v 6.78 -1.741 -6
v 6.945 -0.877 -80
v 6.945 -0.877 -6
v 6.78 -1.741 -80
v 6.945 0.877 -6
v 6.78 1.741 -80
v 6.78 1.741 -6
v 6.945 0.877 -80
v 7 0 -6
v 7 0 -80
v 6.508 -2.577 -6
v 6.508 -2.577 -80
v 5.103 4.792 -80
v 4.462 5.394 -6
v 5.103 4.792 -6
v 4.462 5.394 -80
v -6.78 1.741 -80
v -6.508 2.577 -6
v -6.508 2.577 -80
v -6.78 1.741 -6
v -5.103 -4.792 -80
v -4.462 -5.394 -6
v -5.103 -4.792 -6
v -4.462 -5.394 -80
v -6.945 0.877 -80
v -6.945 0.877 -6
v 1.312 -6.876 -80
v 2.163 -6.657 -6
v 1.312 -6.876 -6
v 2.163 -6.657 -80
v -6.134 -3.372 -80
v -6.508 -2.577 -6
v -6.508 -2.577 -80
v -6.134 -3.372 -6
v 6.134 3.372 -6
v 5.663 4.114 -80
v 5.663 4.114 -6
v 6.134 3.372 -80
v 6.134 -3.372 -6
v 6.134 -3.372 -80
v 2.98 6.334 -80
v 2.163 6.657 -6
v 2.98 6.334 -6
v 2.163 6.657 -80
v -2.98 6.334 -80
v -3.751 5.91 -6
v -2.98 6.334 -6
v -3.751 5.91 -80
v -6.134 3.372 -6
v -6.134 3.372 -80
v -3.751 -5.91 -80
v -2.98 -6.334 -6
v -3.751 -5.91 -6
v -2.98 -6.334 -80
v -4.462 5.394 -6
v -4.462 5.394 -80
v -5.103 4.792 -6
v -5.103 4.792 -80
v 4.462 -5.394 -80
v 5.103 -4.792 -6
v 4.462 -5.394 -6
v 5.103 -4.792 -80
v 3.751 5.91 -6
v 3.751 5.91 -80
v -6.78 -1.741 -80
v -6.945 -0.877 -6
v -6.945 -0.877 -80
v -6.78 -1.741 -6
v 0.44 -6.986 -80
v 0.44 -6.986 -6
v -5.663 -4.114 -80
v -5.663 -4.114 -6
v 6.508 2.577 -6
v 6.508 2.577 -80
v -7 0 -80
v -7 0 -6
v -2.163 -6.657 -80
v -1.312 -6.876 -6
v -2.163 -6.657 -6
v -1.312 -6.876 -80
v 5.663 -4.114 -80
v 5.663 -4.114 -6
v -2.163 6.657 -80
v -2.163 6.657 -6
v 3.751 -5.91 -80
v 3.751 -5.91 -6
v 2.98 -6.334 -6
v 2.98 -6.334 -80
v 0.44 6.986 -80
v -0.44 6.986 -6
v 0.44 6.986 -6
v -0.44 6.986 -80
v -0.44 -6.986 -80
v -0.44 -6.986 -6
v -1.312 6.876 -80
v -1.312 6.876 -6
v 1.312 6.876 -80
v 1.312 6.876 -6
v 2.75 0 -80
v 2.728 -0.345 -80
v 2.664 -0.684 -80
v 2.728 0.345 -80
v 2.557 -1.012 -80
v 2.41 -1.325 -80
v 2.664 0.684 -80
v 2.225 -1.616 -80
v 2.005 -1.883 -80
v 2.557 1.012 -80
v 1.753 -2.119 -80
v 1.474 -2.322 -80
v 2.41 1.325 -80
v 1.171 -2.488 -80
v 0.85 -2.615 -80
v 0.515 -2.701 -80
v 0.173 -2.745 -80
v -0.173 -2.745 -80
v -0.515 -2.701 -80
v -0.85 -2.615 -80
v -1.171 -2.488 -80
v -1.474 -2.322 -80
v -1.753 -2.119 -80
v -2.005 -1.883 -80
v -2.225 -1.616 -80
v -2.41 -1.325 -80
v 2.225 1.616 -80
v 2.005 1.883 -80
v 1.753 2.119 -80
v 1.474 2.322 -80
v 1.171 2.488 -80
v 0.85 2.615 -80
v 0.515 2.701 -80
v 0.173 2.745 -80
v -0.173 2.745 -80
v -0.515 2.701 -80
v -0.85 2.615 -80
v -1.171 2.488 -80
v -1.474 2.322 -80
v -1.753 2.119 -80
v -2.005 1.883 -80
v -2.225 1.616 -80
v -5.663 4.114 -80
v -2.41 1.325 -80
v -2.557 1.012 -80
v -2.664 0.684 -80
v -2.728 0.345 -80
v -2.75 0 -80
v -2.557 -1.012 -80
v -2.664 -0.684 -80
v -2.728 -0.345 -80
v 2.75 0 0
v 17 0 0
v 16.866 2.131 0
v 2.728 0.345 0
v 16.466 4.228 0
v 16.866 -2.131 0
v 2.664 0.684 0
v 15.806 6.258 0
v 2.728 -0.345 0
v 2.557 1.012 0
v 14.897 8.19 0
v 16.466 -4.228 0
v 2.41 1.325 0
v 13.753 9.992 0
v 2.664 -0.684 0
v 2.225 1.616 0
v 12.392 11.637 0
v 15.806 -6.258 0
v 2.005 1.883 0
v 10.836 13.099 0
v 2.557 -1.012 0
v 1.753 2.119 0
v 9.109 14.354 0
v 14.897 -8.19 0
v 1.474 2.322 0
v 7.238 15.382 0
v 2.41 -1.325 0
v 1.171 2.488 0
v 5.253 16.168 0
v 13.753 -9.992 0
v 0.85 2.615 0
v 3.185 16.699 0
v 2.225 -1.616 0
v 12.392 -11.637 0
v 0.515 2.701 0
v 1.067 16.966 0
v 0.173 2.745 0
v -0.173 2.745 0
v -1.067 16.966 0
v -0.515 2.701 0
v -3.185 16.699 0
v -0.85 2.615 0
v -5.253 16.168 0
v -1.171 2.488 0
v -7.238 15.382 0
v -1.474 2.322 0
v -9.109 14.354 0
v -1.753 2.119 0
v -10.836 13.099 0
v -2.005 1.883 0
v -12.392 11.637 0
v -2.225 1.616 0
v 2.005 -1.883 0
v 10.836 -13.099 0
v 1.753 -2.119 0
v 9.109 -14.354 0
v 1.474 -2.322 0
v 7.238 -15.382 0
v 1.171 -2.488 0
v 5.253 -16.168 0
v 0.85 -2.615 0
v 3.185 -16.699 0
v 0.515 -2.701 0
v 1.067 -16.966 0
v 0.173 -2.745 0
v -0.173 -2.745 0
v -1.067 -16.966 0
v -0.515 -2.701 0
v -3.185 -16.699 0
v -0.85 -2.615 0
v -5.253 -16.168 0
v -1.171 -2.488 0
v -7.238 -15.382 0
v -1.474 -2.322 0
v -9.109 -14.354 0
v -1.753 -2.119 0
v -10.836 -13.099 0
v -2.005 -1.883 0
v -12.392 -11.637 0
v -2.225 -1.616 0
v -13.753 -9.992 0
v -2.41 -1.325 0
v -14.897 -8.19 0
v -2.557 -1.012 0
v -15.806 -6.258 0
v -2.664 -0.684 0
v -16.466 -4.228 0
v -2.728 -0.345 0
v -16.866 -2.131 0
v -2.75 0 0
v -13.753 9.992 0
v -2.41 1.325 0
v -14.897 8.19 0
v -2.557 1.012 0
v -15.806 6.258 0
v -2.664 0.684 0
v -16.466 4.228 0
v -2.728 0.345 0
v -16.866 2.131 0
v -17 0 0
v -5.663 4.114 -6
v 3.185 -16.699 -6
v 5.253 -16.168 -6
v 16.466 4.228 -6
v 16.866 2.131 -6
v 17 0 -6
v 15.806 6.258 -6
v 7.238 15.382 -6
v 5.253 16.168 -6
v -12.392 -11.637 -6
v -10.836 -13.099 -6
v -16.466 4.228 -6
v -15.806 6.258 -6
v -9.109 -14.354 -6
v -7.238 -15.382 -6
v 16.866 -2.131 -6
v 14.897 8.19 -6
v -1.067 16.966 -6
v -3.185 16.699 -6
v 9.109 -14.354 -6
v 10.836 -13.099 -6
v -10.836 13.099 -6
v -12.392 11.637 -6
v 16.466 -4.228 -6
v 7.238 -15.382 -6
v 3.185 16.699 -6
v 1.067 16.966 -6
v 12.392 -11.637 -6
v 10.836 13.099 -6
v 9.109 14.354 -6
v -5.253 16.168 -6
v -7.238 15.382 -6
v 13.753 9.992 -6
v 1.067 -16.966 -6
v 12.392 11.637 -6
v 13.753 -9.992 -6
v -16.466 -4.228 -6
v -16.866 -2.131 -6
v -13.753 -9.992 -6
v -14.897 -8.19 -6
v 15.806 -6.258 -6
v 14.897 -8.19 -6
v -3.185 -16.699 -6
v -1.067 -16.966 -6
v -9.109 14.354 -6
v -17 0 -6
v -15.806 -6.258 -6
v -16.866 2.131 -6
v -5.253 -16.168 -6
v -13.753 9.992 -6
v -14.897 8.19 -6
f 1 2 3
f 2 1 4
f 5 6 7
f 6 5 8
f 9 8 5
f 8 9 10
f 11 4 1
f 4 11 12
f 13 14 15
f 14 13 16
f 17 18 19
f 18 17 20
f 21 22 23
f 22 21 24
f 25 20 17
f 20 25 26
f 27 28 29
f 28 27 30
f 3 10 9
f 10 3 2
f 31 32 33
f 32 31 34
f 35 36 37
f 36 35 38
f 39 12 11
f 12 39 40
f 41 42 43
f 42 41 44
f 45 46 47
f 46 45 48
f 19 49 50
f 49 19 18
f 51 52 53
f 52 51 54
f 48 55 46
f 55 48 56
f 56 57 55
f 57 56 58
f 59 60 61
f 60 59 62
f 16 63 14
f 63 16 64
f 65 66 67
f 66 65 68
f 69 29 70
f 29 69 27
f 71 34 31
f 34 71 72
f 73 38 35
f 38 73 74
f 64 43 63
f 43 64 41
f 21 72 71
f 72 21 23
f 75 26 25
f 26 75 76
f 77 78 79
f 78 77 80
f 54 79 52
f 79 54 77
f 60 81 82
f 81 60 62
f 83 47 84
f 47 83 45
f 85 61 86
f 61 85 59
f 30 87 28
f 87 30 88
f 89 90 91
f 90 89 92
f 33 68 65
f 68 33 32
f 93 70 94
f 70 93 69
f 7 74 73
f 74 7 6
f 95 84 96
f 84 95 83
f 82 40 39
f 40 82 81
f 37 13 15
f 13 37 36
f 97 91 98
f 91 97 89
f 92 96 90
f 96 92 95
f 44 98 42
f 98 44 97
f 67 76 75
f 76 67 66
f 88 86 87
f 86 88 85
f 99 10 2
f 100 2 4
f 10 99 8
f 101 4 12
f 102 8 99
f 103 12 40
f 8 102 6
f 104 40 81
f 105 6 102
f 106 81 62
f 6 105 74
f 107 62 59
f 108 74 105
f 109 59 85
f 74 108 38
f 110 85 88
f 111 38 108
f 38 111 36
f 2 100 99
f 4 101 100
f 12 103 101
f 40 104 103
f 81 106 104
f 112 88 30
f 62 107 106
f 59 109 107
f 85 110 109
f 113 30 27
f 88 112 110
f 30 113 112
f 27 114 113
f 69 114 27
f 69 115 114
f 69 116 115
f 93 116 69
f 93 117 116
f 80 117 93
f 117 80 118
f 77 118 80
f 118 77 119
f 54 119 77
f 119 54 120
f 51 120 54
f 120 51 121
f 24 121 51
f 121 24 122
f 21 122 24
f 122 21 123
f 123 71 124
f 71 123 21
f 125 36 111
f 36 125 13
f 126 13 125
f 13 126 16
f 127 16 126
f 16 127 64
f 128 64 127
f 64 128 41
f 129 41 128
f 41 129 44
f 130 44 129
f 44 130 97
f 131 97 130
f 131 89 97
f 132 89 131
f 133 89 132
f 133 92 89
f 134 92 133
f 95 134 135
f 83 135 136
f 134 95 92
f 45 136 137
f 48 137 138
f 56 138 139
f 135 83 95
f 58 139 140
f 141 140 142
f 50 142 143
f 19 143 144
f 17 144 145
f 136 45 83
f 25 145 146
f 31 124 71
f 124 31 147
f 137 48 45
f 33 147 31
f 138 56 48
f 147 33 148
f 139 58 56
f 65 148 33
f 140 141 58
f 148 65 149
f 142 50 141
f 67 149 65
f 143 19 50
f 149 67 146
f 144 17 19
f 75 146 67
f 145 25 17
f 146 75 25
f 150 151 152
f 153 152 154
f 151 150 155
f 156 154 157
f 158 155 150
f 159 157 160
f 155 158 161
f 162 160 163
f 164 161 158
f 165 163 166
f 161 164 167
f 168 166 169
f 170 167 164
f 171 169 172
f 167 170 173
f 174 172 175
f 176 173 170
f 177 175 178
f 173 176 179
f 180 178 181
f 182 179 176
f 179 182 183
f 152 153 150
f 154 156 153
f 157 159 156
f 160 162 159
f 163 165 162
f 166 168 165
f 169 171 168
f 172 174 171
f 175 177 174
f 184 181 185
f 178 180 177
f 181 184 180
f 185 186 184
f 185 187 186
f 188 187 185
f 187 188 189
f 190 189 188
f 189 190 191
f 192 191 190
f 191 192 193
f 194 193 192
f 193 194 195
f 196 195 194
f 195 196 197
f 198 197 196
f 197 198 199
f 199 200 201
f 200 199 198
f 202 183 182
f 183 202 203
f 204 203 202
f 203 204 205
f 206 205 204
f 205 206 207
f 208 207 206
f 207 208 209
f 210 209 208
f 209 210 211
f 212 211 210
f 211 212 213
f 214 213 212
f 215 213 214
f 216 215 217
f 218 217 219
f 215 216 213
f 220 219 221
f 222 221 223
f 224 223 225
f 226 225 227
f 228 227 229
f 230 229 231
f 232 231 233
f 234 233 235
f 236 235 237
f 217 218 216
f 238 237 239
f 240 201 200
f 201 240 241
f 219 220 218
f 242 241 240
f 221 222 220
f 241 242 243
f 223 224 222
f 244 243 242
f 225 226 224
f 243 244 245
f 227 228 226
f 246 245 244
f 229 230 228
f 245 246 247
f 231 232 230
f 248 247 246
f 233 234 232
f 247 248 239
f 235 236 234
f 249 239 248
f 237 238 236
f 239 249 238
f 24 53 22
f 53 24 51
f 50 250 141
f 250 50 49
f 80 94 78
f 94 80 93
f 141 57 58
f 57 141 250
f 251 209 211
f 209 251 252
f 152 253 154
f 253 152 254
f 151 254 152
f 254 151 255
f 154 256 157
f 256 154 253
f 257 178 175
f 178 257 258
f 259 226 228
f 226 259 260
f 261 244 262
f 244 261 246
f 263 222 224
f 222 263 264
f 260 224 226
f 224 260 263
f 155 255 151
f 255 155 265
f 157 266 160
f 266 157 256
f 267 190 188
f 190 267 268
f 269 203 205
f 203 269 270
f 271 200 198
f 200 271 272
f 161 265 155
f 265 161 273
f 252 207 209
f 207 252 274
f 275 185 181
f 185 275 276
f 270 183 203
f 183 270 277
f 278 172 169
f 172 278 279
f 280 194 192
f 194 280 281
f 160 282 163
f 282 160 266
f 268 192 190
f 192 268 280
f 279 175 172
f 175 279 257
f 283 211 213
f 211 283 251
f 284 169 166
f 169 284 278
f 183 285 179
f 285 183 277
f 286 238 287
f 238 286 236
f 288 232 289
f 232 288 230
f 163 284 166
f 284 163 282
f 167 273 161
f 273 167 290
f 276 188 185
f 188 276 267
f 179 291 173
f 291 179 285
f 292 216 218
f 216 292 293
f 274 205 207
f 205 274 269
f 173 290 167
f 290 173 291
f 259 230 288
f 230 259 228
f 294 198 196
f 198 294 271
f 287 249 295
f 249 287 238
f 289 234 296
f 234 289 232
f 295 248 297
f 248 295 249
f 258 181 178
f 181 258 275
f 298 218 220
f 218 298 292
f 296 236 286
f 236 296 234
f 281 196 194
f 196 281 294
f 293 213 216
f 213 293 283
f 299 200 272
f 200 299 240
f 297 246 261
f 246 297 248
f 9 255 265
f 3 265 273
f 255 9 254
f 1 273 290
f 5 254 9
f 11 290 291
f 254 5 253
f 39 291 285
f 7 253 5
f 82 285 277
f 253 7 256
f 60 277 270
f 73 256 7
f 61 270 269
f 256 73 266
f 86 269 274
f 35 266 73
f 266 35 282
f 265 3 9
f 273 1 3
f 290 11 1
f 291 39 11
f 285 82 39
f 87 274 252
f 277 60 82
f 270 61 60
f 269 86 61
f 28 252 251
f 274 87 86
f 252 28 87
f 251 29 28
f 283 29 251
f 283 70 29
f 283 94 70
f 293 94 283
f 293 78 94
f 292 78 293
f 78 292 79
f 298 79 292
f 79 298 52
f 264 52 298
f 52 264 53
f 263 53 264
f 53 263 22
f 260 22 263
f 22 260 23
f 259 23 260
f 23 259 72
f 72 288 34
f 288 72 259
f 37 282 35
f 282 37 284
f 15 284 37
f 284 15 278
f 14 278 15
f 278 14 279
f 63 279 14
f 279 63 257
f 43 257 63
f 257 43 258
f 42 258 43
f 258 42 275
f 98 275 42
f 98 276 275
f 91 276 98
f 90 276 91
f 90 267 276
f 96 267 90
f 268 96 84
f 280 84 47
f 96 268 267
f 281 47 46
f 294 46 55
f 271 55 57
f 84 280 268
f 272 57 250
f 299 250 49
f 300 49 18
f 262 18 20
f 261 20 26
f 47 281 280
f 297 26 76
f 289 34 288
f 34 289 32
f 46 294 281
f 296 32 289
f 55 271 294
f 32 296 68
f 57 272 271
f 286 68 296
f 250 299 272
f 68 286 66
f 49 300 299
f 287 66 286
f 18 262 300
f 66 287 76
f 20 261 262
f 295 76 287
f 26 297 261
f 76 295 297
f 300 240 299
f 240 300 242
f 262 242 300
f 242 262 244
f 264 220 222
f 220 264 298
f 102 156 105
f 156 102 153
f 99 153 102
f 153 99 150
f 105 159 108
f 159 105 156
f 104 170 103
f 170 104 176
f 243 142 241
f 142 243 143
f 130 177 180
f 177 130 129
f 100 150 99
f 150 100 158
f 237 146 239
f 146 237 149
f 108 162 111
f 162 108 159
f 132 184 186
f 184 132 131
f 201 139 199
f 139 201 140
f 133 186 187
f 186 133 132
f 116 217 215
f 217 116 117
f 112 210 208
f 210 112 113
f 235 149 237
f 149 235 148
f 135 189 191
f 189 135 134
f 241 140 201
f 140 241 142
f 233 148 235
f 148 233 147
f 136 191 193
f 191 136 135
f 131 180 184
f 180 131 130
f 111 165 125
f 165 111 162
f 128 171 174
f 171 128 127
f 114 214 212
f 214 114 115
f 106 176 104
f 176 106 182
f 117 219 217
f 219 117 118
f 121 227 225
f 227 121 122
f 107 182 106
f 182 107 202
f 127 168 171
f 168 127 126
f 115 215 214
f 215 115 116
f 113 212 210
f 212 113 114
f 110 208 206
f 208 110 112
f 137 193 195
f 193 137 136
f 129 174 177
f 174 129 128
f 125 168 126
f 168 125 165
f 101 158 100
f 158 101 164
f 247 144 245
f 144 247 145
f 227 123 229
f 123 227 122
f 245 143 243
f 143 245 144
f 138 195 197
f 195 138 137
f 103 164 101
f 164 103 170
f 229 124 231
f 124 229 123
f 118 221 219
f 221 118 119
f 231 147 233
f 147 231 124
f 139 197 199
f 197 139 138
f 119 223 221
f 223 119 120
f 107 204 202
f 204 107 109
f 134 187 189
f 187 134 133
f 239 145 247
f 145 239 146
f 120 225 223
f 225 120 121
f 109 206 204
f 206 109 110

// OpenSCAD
$fn = 50;


difference() {
	union() {
		translate(v = [0, 0, -80.0000000000]) {
			cylinder(h = 80, r = 7.0000000000);
		}
		translate(v = [0, 0, -6.0000000000]) {
			cylinder(h = 6, r = 17.0000000000);
		}
	}
	union() {
		#translate(v = [0, 0, -80]) {
			cylinder(h = 80, r = 2.7500000000);
		}
	}
}
